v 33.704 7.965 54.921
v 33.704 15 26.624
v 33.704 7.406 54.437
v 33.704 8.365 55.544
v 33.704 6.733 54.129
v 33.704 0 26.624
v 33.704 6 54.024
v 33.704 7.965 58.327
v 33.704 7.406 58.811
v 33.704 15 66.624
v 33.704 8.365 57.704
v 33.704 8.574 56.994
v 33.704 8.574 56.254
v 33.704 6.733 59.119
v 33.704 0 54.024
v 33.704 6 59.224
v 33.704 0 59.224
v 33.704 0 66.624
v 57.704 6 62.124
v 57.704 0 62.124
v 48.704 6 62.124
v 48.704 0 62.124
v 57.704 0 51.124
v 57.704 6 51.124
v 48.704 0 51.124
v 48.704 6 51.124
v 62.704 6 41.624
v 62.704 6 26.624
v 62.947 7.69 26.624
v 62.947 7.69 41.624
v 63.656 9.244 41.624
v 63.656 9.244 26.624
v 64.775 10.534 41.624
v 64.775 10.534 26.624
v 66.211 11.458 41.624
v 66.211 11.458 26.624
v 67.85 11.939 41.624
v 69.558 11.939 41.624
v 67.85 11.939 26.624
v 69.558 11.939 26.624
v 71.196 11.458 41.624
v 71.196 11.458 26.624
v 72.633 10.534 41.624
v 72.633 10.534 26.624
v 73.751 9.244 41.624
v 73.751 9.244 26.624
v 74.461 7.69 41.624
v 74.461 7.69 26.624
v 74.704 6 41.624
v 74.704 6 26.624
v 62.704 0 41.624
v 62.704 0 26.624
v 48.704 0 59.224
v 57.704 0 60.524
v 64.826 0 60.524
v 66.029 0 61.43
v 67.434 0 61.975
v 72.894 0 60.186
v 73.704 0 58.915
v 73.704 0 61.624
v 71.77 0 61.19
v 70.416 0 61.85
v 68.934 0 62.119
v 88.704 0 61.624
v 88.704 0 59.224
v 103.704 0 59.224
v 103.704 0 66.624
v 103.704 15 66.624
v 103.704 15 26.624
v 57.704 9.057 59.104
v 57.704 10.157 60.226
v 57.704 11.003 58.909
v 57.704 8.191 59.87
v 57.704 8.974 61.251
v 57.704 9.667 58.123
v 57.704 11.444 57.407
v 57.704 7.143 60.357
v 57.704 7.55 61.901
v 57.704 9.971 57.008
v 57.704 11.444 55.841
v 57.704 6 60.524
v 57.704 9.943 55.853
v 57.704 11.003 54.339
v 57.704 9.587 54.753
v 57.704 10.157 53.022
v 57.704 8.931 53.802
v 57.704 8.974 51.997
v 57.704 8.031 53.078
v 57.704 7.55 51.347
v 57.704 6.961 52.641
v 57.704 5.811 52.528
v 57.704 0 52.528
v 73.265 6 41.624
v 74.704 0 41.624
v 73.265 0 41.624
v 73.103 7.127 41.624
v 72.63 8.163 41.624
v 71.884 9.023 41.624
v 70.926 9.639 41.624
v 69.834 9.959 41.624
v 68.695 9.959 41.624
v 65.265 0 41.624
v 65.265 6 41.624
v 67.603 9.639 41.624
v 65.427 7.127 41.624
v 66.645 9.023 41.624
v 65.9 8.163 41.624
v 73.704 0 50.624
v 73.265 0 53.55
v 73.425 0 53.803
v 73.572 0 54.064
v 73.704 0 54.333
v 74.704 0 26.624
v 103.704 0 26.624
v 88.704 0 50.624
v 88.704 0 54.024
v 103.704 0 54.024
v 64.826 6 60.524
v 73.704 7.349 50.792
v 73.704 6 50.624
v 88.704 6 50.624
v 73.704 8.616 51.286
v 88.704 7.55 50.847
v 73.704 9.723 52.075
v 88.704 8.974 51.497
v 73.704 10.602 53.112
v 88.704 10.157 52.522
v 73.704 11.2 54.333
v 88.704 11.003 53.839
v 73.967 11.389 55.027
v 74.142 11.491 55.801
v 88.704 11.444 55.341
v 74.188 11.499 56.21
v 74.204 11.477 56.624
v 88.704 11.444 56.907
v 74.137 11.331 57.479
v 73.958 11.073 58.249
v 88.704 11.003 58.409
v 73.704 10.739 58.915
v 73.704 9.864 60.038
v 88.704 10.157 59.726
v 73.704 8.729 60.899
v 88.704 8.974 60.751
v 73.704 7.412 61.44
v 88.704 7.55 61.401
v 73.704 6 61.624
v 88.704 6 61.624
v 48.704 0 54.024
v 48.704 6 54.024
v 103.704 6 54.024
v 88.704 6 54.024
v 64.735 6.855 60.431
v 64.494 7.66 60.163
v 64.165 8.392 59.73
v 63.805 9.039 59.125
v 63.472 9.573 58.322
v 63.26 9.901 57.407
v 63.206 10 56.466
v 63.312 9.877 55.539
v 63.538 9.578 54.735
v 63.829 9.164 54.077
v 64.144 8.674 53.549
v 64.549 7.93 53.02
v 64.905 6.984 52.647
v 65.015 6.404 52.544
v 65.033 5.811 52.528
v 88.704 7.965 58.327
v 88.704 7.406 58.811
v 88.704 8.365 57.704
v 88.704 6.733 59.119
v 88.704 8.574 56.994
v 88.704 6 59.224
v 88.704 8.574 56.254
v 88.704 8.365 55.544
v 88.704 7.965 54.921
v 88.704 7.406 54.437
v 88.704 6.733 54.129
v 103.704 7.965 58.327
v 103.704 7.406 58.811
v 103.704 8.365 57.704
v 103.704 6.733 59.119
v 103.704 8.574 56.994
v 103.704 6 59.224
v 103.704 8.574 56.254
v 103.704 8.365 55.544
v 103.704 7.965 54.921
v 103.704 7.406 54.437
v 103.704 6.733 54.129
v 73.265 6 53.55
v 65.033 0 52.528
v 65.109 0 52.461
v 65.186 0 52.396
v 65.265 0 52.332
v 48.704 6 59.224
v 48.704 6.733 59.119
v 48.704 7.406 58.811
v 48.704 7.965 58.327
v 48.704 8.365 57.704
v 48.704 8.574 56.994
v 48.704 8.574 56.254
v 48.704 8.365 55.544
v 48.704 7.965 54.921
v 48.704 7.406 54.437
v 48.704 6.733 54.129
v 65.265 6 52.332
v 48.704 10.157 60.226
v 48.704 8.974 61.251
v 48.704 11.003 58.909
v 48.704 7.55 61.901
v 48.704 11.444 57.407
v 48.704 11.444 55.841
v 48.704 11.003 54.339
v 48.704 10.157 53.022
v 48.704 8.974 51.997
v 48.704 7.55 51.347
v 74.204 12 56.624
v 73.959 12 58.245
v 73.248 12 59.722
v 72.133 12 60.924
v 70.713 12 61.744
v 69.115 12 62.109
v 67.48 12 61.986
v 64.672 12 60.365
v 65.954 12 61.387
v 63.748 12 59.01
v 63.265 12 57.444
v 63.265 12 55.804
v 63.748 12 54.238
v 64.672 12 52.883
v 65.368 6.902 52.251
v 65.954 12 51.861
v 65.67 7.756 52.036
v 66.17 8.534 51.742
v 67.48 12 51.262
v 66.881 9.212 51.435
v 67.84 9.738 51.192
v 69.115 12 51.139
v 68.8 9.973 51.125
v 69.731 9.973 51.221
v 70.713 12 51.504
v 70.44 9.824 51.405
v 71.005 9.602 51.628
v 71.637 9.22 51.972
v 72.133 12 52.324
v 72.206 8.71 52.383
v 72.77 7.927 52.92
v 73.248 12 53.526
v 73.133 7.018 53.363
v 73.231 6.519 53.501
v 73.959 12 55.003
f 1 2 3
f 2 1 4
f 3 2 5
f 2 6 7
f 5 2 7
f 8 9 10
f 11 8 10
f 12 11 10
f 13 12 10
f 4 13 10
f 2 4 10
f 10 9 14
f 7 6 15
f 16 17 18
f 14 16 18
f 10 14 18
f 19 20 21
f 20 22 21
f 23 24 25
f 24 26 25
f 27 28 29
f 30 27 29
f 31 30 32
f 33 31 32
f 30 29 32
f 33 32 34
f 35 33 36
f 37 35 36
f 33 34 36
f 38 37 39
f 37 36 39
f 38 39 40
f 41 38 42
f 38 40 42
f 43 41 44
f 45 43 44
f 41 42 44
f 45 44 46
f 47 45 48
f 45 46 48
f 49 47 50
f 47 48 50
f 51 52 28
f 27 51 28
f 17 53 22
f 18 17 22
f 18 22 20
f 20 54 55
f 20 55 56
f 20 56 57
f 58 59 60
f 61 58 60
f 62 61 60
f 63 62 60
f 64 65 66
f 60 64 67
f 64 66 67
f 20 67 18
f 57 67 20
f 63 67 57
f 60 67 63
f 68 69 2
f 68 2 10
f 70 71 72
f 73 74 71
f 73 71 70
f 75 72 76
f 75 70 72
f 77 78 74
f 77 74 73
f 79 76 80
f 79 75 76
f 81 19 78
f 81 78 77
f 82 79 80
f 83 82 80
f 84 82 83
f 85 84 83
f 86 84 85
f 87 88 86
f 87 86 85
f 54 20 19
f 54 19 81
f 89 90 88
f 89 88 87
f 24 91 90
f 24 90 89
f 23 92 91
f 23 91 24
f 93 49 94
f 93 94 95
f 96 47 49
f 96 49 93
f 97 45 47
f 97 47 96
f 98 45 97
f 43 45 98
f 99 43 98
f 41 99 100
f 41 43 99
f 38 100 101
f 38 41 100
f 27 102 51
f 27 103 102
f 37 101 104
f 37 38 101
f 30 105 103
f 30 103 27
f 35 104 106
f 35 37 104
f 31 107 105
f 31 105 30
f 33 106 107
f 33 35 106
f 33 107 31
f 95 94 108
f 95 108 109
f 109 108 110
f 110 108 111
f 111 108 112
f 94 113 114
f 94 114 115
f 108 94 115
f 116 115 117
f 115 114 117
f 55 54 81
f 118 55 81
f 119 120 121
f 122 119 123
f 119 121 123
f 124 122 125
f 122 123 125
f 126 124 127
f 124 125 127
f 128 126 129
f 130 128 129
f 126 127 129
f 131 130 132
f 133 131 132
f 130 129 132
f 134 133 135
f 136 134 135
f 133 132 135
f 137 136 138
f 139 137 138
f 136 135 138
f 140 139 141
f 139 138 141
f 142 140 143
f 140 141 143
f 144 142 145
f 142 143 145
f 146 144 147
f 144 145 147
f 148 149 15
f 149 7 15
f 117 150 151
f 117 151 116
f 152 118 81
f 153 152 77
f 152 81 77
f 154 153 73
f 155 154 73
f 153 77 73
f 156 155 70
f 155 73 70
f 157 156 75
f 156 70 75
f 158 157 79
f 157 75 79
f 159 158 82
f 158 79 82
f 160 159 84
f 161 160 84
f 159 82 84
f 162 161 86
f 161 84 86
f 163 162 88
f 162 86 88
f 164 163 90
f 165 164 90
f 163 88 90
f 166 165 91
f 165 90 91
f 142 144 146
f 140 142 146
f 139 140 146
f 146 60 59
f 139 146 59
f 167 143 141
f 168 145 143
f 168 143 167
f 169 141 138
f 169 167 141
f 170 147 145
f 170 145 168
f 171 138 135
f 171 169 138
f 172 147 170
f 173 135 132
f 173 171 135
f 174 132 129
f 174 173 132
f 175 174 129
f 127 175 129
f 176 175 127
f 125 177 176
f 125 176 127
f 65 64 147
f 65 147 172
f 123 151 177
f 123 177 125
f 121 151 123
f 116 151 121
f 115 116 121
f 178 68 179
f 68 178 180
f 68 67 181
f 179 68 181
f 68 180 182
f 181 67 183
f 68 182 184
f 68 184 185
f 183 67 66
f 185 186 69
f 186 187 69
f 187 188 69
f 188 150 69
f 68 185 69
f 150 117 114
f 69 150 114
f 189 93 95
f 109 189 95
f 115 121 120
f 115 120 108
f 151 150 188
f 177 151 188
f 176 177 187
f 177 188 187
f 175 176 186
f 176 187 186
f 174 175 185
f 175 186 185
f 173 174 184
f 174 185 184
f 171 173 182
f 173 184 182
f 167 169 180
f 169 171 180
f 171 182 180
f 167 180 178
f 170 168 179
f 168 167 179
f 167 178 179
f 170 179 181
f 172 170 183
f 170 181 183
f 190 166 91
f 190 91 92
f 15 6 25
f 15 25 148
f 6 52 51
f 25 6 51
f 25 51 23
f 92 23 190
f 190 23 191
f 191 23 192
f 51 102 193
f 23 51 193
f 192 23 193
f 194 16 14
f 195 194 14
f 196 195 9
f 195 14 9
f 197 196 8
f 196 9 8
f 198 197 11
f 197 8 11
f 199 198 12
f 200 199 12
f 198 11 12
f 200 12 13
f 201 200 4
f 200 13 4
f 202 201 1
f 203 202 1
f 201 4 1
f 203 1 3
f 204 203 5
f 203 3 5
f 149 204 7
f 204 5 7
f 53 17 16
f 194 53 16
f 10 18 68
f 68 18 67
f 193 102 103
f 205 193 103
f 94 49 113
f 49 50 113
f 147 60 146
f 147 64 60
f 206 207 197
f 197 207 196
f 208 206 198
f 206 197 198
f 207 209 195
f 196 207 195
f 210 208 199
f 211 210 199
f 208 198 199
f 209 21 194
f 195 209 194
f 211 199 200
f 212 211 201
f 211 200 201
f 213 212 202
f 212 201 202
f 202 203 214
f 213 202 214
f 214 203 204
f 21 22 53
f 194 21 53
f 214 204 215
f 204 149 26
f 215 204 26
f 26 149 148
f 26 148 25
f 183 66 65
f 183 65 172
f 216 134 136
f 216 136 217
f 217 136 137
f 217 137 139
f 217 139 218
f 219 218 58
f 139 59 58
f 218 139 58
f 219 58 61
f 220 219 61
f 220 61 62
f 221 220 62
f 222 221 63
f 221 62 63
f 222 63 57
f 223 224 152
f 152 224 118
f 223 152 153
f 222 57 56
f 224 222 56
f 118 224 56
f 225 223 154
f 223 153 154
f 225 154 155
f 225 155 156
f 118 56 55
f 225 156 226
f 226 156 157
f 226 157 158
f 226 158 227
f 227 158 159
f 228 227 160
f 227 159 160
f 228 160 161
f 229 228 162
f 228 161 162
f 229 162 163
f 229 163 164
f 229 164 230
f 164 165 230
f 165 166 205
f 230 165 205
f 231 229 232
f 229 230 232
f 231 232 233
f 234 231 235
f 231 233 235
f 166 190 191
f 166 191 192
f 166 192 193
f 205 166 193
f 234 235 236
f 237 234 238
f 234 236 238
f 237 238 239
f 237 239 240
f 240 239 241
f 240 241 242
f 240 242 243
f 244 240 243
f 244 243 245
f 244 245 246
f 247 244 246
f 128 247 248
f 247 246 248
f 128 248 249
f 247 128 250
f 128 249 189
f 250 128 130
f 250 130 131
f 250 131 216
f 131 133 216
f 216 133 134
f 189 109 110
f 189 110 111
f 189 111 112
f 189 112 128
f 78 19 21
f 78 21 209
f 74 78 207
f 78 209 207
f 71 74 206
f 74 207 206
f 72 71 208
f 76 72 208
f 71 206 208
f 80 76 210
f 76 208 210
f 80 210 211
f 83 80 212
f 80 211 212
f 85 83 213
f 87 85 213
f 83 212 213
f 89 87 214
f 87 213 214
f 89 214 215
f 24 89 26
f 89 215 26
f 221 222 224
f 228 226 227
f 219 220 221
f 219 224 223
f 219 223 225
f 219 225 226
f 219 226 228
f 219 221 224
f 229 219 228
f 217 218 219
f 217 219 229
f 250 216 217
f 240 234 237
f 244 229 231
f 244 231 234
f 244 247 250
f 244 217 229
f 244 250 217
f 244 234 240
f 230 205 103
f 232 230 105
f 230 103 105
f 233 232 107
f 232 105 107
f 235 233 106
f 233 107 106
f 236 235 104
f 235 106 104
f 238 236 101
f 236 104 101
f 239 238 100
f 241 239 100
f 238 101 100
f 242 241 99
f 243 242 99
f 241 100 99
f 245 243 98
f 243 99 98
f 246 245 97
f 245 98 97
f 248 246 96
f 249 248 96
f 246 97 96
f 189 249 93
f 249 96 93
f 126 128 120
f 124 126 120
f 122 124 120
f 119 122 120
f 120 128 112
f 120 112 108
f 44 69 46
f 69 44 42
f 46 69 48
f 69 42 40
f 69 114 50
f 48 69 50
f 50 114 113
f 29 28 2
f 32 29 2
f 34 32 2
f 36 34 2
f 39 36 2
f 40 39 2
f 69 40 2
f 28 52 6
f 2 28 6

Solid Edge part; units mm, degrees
sketch "Sketch1" plane through (0, 0, 0) normal (0, -1, 0) x (1, 0, 0)
  line L0 (33.7037, 66.6239) -> (103.7037, 66.6239)
  line L1 (103.7037, 66.6239) -> (103.7037, 26.6239)
  line L2 (103.7037, 26.6239) -> (33.7037, 26.6239)
  line L3 (33.7037, 26.6239) -> (33.7037, 66.6239)
  dimension "D1" = 70
  dimension "D2" = 40
  dimension "D3" = 70
  dimension "D4" = 40
extrude "Protrusion1" add sketch "Sketch1" against normal blind 15
sketch "Sketch2" plane through (68.7037, 0, 46.6239) normal (0, -1, 0) x (1, 0, 0)
  circle A0 centre (0, 10) radius 5.5
  dimension "D1" = 11
  dimension "D2" = 10
extrude "ExtrudedCutout_1" cut sketch "Sketch2" against normal blind 12
sketch "Sketch3" plane through (103.7037, 7.5, 46.6239) normal (1, 0, 0) x (0, 1, 0)
  line L0 (-7.5, 12.6) -> (-1.5, 12.6)
  arc A0 (-1.5, 12.6) -> (-1.5, 7.4) centre (-1.5, 10) cw
  line L1 (-1.5, 7.4) -> (-7.5, 7.4)
  line L2 (-7.5, 7.4) -> (-7.5, 12.6)
  dimension "D1" = 6
  dimension "D2" = 7.4
  dimension "D3" = 2.6
extrude "ExtrudedCutout_4" cut sketch "Sketch3" against normal blind 15
sketch "Sketch4" plane through (88.7037, 4.3, 55.6239) normal (1, 0, 0) x (0, 1, 0)
  line L0 (-4.3, 6) -> (1.7, 6)
  arc A0 (1.7, 6) -> (1.7, -5) centre (1.7, 0.5) cw
  line L1 (1.7, -5) -> (-4.3, -5)
  line L2 (-4.3, -5) -> (-4.3, 6)
  dimension "D1" = 6
  dimension "D2" = 5
  dimension "D3" = 5.5
extrude "ExtrudedCutout_5" cut sketch "Sketch4" against normal blind 15
sketch "Sketch5" plane through (33.7037, 7.5, 46.6239) normal (-1, 0, 0) x (0, -1, 0)
  line L0 (7.5, 12.6) -> (1.5, 12.6)
  arc A0 (1.5, 12.6) -> (1.5, 7.4) centre (1.5, 10) ccw
  line L1 (1.5, 7.4) -> (7.5, 7.4)
  line L2 (7.5, 7.4) -> (7.5, 12.6)
  dimension "D1" = 6
  dimension "D2" = 7.4
  dimension "D3" = 2.6
extrude "ExtrudedCutout_6" cut sketch "Sketch5" against normal blind 15
sketch "Sketch6" plane through (48.7037, 4.3, 56.6239) normal (-1, 0, 0) x (0, -1, 0)
  line L0 (4.3, 5.5) -> (-1.7, 5.5)
  arc A0 (-1.7, 5.5) -> (-1.7, -5.5) centre (-1.7, 0) ccw
  line L1 (-1.7, -5.5) -> (4.3, -5.5)
  line L2 (4.3, -5.5) -> (4.3, 5.5)
  dimension "D1" = 4.5
  dimension "D2" = 5.5
  dimension "D3" = 6
extrude "ExtrudedCutout_7" cut sketch "Sketch6" against normal blind 9
sketch "Sketch7" plane through (57.7037, 5.75, 56.6239) normal (-1, 0, 0) x (0, -1, 0)
  line L0 (5.75, 3.9) -> (-0.25, 3.9)
  arc A0 (-0.25, 3.9) -> (-0.0606, -4.0955) centre (-0.25, -0.1) ccw
  line L1 (-0.0606, -4.0955) -> (5.75, -4.0955)
  line L2 (5.75, -4.0955) -> (5.75, 3.9)
  dimension "D1" = 6
  dimension "D2" = 6.1
  dimension "D3" = 4
extrude "Cutout1" cut sketch "Sketch7" against normal up to next
sketch "Sketch8" plane through (68.7037, 7.5, 26.6239) normal (0, 0, -1) x (1, 0, 0)
  line L0 (-6, 7.5) -> (-6, 1.5)
  arc A0 (-6, 1.5) -> (6, 1.5) centre (0, 1.5) ccw
  line L1 (6, 1.5) -> (6, 7.5)
  line L2 (6, 7.5) -> (-6, 7.5)
  dimension "D1" = 6
  dimension "D2" = 6
  dimension "D3" = 6
extrude "ExtrudedCutout_9" cut sketch "Sketch8" against normal blind 15
sketch "Sketch9" plane through (68.7037, 5.75, 41.6239) normal (0, 0, -1) x (1, 0, 0)
  line L0 (-3.4391, 5.75) -> (-3.4391, -0.25)
  arc A0 (-3.4391, -0.25) -> (4.5609, -0.25) centre (0.5609, -0.25) ccw
  line L1 (4.5609, -0.25) -> (4.5609, 5.75)
  line L2 (4.5609, 5.75) -> (-3.4391, 5.75)
  dimension "D1" = 6
  dimension "D2" = 4
  dimension "D3" = 4
extrude "Cutout2" cut sketch "Sketch9" against normal up to next
